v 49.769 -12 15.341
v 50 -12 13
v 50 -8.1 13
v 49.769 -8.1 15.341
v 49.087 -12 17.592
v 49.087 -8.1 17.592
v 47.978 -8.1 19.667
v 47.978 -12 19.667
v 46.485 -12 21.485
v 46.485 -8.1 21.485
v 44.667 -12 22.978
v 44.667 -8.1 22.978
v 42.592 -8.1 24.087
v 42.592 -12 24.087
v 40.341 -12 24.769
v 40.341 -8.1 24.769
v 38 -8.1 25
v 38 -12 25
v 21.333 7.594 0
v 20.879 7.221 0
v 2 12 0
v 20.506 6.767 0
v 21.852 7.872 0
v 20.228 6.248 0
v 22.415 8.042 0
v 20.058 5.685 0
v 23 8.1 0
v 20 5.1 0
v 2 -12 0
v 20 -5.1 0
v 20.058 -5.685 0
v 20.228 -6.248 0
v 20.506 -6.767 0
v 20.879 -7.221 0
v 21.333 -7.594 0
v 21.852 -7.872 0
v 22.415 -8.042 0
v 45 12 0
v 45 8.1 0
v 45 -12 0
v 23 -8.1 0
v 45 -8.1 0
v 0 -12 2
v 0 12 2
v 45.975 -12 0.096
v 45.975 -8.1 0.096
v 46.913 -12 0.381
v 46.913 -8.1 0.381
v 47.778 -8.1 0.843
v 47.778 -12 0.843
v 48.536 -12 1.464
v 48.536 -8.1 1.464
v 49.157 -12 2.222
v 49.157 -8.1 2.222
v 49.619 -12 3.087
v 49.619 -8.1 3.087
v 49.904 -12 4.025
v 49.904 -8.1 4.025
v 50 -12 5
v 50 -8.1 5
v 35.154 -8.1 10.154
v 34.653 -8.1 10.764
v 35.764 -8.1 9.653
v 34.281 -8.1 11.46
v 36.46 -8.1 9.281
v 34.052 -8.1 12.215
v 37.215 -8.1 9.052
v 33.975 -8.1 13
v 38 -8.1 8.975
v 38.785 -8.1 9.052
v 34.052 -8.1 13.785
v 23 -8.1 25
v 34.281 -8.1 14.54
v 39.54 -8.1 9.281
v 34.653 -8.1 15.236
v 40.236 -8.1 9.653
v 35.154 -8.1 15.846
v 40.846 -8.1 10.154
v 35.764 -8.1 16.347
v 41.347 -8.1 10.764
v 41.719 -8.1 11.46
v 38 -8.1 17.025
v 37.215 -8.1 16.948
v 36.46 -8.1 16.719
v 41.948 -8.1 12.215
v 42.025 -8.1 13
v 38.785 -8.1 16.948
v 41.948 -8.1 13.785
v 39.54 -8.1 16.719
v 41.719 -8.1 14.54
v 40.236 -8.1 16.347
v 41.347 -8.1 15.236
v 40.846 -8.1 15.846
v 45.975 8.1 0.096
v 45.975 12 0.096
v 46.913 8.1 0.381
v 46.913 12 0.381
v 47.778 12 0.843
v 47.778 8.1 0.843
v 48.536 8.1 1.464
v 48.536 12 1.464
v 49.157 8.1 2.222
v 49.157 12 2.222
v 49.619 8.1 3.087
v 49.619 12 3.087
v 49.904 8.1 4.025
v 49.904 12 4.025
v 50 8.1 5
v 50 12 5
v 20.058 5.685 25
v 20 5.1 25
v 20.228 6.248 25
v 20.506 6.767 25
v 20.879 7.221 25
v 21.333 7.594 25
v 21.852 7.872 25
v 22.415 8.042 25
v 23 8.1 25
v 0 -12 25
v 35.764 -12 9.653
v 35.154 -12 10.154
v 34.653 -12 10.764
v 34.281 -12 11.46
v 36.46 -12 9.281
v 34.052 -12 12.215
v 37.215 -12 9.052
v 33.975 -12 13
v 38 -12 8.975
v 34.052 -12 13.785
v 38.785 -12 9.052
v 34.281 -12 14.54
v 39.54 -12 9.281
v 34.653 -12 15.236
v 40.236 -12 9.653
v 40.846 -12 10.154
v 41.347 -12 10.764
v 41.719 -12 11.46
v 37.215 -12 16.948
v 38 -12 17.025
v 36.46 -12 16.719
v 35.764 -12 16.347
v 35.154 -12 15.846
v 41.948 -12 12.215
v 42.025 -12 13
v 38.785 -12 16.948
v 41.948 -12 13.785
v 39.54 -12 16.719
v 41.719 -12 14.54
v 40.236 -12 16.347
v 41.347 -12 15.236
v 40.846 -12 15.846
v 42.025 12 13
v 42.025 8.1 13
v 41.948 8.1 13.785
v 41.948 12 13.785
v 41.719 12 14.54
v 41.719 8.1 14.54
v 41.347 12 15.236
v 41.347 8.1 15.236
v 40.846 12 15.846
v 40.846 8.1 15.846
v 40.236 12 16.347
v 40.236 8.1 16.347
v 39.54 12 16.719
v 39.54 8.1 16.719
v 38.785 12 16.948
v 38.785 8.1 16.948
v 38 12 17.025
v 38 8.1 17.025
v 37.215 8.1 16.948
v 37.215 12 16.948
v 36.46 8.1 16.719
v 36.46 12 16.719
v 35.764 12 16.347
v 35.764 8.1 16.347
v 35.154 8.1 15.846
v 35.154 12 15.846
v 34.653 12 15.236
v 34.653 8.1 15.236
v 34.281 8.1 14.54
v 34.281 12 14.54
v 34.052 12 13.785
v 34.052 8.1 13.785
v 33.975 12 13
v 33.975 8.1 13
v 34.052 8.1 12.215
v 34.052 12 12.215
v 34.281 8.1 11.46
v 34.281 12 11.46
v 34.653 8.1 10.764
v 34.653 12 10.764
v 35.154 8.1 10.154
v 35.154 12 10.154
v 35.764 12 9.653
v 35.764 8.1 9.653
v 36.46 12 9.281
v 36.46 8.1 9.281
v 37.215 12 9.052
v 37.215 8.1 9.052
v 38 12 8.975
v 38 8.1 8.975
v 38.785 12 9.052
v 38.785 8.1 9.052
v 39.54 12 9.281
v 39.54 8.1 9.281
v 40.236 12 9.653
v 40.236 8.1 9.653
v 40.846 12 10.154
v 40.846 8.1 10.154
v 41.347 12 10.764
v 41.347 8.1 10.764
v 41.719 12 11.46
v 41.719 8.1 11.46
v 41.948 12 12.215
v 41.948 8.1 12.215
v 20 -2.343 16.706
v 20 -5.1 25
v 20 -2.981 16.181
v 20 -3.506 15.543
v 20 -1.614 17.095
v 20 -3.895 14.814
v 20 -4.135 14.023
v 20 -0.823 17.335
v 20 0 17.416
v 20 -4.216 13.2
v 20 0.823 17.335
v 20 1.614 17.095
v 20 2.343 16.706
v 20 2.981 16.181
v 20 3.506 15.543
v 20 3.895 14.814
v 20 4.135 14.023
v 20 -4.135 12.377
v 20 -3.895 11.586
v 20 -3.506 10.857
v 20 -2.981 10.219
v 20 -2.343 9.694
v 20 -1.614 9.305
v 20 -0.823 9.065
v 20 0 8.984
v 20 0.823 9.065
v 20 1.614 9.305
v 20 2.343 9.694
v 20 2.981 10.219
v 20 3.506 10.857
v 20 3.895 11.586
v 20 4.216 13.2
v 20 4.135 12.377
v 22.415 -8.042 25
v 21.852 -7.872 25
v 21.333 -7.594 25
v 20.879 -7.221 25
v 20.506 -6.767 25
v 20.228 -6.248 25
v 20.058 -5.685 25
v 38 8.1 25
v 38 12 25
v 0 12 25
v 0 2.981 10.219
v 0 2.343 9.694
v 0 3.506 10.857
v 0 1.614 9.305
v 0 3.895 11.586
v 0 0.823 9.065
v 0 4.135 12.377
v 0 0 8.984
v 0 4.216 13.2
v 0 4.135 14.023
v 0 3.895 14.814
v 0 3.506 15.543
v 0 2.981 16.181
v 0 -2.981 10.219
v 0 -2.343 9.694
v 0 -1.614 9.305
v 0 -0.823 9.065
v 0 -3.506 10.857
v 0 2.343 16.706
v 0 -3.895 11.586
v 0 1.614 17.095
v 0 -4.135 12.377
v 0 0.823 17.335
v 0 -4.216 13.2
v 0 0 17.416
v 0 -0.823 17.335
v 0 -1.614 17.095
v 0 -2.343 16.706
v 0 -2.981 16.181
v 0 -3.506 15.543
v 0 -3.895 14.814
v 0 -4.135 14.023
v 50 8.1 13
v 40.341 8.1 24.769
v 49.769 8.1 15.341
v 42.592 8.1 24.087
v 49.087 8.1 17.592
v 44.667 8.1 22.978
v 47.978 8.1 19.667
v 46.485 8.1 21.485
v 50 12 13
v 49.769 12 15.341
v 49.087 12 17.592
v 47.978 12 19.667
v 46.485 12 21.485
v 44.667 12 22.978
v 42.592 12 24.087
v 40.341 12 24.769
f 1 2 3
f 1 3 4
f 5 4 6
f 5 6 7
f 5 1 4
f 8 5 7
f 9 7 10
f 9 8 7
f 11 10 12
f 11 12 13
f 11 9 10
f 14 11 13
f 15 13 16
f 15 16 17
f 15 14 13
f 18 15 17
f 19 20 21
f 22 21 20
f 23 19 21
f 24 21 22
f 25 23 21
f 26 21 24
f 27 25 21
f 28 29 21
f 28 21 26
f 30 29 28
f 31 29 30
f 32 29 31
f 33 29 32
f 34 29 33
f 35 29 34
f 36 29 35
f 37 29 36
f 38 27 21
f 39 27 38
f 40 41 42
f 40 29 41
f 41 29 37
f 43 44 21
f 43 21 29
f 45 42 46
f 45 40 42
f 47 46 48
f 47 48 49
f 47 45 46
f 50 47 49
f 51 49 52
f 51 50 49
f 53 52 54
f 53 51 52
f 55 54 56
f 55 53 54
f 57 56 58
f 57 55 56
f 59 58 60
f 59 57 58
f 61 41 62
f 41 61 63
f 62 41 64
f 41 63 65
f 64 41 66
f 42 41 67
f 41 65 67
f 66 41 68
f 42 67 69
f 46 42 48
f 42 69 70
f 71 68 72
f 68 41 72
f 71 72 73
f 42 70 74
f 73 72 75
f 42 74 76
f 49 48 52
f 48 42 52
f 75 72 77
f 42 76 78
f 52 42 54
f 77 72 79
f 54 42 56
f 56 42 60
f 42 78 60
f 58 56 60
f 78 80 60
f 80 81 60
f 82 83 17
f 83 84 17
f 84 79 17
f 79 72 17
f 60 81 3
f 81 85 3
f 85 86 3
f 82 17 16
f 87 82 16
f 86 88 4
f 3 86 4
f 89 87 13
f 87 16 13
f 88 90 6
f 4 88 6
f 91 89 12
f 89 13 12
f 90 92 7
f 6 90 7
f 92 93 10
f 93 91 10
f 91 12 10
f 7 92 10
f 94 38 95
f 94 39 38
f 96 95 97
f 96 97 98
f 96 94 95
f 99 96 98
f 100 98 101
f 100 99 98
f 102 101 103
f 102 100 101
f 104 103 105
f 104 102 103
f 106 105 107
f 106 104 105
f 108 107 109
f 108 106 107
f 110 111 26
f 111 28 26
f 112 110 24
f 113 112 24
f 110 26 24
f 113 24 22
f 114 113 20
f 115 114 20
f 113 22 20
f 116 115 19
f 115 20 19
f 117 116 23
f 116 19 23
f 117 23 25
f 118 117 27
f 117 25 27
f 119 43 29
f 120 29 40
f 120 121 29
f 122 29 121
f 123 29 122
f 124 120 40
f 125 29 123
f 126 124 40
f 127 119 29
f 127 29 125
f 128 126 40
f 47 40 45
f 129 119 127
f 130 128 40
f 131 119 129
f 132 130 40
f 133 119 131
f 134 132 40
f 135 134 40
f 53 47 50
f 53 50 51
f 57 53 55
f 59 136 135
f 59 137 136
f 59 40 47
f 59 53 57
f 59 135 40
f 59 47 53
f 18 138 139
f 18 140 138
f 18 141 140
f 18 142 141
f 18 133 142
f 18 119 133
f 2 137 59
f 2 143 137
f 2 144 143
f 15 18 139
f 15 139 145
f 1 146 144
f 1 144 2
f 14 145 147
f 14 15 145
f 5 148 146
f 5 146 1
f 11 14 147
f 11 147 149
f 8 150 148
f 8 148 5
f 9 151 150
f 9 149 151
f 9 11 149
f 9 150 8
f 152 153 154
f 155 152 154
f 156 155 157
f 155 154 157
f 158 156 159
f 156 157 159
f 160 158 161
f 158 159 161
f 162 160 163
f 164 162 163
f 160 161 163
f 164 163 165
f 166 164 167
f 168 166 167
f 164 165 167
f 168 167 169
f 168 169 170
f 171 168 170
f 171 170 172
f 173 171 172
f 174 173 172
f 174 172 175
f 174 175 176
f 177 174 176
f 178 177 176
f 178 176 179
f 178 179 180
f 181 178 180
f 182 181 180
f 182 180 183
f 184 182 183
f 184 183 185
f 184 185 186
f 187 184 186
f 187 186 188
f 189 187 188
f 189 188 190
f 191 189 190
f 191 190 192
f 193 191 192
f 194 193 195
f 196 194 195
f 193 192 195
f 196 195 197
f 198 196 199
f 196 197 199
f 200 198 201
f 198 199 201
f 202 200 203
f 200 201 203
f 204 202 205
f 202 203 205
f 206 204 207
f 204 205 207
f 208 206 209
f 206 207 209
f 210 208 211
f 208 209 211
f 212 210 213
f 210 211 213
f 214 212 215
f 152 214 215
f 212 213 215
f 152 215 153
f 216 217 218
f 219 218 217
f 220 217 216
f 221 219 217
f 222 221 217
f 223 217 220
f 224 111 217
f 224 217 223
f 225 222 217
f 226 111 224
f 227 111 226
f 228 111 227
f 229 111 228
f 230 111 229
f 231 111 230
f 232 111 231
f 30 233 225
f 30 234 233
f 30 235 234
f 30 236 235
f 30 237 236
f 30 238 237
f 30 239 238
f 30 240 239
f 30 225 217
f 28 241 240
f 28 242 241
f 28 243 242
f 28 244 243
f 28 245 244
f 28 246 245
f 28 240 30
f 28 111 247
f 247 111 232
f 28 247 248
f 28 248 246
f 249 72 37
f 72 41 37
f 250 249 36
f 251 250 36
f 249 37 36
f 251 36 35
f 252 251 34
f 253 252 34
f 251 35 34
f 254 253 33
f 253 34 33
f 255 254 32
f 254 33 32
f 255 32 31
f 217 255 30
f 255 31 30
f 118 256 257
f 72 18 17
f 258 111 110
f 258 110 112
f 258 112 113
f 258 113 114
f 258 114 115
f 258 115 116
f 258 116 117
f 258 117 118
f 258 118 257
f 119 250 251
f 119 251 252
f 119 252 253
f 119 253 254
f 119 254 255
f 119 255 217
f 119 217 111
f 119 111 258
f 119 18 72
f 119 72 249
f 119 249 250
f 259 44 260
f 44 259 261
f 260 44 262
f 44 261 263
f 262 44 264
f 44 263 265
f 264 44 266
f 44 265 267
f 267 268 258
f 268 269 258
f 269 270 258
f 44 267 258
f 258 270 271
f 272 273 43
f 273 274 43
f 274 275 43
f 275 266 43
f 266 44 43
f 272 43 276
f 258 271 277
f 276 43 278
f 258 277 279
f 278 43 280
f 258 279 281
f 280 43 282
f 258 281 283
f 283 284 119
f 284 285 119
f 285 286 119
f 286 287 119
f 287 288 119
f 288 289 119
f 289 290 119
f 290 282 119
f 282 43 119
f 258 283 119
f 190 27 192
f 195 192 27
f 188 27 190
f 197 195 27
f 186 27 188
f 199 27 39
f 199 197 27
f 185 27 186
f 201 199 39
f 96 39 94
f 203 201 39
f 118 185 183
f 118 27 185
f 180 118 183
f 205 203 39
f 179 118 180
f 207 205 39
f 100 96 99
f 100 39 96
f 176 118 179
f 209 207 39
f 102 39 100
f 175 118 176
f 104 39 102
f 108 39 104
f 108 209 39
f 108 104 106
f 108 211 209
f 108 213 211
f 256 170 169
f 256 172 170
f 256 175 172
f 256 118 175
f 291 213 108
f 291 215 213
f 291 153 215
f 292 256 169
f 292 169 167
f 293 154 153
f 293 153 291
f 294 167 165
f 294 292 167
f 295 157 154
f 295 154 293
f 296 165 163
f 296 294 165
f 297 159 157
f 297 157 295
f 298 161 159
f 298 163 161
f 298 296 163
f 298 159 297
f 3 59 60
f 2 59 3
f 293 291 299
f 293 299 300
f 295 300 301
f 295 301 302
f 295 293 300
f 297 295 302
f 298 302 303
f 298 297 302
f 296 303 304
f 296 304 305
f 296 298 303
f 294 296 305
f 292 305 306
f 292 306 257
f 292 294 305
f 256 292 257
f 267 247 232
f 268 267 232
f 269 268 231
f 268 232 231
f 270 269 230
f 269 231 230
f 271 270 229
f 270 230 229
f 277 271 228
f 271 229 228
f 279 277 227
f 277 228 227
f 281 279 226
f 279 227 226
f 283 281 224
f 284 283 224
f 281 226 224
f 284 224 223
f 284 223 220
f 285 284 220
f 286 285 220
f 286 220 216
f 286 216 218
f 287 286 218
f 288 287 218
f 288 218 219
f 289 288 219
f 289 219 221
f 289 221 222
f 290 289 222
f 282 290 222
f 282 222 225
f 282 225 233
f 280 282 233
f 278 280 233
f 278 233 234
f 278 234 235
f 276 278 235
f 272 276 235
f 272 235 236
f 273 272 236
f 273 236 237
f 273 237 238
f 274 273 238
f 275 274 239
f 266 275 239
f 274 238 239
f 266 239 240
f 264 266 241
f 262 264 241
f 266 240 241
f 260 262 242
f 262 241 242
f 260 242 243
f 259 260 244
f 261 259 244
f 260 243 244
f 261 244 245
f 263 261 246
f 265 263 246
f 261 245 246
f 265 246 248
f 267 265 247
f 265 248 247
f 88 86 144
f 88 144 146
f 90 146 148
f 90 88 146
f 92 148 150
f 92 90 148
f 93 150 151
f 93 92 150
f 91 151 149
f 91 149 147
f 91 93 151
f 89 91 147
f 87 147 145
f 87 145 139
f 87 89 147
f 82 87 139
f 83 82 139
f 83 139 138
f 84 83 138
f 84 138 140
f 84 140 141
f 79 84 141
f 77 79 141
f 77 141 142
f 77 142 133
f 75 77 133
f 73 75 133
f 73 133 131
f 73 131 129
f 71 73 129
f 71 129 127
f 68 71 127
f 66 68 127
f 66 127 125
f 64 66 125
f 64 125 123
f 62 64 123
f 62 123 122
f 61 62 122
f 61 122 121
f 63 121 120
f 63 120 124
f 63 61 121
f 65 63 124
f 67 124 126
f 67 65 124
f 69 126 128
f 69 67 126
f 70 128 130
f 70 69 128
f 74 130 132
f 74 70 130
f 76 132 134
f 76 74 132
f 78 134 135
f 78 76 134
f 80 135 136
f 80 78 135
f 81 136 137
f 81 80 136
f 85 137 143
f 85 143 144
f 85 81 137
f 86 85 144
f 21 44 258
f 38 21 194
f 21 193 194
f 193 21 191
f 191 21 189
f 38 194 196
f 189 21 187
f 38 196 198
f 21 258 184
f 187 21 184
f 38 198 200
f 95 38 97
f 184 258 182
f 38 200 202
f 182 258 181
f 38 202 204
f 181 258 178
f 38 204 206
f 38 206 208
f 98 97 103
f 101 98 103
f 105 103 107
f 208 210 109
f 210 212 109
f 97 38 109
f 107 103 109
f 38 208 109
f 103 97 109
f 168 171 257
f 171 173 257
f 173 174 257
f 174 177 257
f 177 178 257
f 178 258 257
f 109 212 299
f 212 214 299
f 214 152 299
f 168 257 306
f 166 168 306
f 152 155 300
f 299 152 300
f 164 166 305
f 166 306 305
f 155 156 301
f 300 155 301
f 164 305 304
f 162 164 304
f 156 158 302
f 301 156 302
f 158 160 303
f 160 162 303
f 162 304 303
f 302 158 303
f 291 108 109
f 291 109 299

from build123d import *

# Parameters (mm, degrees)
F0_W          = 20
F0_H          = 25
F0_R          = 4.025
F1_DEPTH      = 12
F1_DEPTH_BACK = 12
F2_DEPTH      = 8.1
F2_DEPTH_BACK = 8.1
F3_R          = 3
F4_R          = 5
F6_D          = 8.4328
F6_DEPTH      = 30.794
F6_TIP        = 2.5334687141
F7_SIZE       = 2


with BuildPart() as f1:
    # F0 (on Front) → F1 (new body, two sides)
    with BuildSketch(Plane.XZ) as f1_sk:
        with Locations((10, 12.5)):
            Rectangle(F0_W, F0_H)
        with BuildLine():
            Line((20, 25), (20, 0))
            Line((20, 0), (50, 0))
            Line((50, 0), (50, 13))
            ThreePointArc((50, 13), (46.4852813742, 21.4852813742), (38, 25))
            Line((38, 25), (20, 25))
        make_face()
        with Locations((38, 13)):
            Circle(F0_R, mode=Mode.SUBTRACT)
    extrude(amount=F1_DEPTH)
    extrude(f1_sk.sketch, amount=-F1_DEPTH_BACK)

    # F0 (on Front) → F2 (cut, two sides)
    with BuildSketch(Plane.XZ) as f2_sk:
        with BuildLine():
            Line((20, 25), (20, 0))
            Line((20, 0), (50, 0))
            Line((50, 0), (50, 13))
            ThreePointArc((50, 13), (46.4852813742, 21.4852813742), (38, 25))
            Line((38, 25), (20, 25))
        make_face()
        with Locations((38, 13)):
            Circle(F0_R, mode=Mode.SUBTRACT)
    extrude(amount=-F2_DEPTH, mode=Mode.SUBTRACT)
    extrude(f2_sk.sketch, amount=F2_DEPTH_BACK, mode=Mode.SUBTRACT)

    # F3
    f3_edges = [f1.edges().sort_by_distance(p)[0] for p in [
        (20, -8.1, 12.5),
        (20, 8.1, 12.5),
    ]]
    fillet(f3_edges, radius=F3_R)

    # F4
    f4_edges = [f1.edges().sort_by_distance(p)[0] for p in [
        (50, -10.05, 0),
        (50, 10.05, 0),
    ]]
    fillet(f4_edges, radius=F4_R)

    # F6
    with Locations(Plane(origin=(0, 0, 0), x_dir=(0, -1, 0), z_dir=(-1, 0, 0))):
        with Locations((0, 13.2)):
            Hole(F6_D / 2, depth=F6_DEPTH)
            with Locations((0, 0, -(F6_DEPTH + F6_TIP / 2))):  # 118° drill point
                Cone(0, F6_D / 2, F6_TIP, mode=Mode.SUBTRACT)

    # F7
    f7_edges = [f1.edges().sort_by_distance(p)[0] for p in [
        (0, 0, 0),
    ]]
    chamfer(f7_edges, length=F7_SIZE)


solid = f1.part
